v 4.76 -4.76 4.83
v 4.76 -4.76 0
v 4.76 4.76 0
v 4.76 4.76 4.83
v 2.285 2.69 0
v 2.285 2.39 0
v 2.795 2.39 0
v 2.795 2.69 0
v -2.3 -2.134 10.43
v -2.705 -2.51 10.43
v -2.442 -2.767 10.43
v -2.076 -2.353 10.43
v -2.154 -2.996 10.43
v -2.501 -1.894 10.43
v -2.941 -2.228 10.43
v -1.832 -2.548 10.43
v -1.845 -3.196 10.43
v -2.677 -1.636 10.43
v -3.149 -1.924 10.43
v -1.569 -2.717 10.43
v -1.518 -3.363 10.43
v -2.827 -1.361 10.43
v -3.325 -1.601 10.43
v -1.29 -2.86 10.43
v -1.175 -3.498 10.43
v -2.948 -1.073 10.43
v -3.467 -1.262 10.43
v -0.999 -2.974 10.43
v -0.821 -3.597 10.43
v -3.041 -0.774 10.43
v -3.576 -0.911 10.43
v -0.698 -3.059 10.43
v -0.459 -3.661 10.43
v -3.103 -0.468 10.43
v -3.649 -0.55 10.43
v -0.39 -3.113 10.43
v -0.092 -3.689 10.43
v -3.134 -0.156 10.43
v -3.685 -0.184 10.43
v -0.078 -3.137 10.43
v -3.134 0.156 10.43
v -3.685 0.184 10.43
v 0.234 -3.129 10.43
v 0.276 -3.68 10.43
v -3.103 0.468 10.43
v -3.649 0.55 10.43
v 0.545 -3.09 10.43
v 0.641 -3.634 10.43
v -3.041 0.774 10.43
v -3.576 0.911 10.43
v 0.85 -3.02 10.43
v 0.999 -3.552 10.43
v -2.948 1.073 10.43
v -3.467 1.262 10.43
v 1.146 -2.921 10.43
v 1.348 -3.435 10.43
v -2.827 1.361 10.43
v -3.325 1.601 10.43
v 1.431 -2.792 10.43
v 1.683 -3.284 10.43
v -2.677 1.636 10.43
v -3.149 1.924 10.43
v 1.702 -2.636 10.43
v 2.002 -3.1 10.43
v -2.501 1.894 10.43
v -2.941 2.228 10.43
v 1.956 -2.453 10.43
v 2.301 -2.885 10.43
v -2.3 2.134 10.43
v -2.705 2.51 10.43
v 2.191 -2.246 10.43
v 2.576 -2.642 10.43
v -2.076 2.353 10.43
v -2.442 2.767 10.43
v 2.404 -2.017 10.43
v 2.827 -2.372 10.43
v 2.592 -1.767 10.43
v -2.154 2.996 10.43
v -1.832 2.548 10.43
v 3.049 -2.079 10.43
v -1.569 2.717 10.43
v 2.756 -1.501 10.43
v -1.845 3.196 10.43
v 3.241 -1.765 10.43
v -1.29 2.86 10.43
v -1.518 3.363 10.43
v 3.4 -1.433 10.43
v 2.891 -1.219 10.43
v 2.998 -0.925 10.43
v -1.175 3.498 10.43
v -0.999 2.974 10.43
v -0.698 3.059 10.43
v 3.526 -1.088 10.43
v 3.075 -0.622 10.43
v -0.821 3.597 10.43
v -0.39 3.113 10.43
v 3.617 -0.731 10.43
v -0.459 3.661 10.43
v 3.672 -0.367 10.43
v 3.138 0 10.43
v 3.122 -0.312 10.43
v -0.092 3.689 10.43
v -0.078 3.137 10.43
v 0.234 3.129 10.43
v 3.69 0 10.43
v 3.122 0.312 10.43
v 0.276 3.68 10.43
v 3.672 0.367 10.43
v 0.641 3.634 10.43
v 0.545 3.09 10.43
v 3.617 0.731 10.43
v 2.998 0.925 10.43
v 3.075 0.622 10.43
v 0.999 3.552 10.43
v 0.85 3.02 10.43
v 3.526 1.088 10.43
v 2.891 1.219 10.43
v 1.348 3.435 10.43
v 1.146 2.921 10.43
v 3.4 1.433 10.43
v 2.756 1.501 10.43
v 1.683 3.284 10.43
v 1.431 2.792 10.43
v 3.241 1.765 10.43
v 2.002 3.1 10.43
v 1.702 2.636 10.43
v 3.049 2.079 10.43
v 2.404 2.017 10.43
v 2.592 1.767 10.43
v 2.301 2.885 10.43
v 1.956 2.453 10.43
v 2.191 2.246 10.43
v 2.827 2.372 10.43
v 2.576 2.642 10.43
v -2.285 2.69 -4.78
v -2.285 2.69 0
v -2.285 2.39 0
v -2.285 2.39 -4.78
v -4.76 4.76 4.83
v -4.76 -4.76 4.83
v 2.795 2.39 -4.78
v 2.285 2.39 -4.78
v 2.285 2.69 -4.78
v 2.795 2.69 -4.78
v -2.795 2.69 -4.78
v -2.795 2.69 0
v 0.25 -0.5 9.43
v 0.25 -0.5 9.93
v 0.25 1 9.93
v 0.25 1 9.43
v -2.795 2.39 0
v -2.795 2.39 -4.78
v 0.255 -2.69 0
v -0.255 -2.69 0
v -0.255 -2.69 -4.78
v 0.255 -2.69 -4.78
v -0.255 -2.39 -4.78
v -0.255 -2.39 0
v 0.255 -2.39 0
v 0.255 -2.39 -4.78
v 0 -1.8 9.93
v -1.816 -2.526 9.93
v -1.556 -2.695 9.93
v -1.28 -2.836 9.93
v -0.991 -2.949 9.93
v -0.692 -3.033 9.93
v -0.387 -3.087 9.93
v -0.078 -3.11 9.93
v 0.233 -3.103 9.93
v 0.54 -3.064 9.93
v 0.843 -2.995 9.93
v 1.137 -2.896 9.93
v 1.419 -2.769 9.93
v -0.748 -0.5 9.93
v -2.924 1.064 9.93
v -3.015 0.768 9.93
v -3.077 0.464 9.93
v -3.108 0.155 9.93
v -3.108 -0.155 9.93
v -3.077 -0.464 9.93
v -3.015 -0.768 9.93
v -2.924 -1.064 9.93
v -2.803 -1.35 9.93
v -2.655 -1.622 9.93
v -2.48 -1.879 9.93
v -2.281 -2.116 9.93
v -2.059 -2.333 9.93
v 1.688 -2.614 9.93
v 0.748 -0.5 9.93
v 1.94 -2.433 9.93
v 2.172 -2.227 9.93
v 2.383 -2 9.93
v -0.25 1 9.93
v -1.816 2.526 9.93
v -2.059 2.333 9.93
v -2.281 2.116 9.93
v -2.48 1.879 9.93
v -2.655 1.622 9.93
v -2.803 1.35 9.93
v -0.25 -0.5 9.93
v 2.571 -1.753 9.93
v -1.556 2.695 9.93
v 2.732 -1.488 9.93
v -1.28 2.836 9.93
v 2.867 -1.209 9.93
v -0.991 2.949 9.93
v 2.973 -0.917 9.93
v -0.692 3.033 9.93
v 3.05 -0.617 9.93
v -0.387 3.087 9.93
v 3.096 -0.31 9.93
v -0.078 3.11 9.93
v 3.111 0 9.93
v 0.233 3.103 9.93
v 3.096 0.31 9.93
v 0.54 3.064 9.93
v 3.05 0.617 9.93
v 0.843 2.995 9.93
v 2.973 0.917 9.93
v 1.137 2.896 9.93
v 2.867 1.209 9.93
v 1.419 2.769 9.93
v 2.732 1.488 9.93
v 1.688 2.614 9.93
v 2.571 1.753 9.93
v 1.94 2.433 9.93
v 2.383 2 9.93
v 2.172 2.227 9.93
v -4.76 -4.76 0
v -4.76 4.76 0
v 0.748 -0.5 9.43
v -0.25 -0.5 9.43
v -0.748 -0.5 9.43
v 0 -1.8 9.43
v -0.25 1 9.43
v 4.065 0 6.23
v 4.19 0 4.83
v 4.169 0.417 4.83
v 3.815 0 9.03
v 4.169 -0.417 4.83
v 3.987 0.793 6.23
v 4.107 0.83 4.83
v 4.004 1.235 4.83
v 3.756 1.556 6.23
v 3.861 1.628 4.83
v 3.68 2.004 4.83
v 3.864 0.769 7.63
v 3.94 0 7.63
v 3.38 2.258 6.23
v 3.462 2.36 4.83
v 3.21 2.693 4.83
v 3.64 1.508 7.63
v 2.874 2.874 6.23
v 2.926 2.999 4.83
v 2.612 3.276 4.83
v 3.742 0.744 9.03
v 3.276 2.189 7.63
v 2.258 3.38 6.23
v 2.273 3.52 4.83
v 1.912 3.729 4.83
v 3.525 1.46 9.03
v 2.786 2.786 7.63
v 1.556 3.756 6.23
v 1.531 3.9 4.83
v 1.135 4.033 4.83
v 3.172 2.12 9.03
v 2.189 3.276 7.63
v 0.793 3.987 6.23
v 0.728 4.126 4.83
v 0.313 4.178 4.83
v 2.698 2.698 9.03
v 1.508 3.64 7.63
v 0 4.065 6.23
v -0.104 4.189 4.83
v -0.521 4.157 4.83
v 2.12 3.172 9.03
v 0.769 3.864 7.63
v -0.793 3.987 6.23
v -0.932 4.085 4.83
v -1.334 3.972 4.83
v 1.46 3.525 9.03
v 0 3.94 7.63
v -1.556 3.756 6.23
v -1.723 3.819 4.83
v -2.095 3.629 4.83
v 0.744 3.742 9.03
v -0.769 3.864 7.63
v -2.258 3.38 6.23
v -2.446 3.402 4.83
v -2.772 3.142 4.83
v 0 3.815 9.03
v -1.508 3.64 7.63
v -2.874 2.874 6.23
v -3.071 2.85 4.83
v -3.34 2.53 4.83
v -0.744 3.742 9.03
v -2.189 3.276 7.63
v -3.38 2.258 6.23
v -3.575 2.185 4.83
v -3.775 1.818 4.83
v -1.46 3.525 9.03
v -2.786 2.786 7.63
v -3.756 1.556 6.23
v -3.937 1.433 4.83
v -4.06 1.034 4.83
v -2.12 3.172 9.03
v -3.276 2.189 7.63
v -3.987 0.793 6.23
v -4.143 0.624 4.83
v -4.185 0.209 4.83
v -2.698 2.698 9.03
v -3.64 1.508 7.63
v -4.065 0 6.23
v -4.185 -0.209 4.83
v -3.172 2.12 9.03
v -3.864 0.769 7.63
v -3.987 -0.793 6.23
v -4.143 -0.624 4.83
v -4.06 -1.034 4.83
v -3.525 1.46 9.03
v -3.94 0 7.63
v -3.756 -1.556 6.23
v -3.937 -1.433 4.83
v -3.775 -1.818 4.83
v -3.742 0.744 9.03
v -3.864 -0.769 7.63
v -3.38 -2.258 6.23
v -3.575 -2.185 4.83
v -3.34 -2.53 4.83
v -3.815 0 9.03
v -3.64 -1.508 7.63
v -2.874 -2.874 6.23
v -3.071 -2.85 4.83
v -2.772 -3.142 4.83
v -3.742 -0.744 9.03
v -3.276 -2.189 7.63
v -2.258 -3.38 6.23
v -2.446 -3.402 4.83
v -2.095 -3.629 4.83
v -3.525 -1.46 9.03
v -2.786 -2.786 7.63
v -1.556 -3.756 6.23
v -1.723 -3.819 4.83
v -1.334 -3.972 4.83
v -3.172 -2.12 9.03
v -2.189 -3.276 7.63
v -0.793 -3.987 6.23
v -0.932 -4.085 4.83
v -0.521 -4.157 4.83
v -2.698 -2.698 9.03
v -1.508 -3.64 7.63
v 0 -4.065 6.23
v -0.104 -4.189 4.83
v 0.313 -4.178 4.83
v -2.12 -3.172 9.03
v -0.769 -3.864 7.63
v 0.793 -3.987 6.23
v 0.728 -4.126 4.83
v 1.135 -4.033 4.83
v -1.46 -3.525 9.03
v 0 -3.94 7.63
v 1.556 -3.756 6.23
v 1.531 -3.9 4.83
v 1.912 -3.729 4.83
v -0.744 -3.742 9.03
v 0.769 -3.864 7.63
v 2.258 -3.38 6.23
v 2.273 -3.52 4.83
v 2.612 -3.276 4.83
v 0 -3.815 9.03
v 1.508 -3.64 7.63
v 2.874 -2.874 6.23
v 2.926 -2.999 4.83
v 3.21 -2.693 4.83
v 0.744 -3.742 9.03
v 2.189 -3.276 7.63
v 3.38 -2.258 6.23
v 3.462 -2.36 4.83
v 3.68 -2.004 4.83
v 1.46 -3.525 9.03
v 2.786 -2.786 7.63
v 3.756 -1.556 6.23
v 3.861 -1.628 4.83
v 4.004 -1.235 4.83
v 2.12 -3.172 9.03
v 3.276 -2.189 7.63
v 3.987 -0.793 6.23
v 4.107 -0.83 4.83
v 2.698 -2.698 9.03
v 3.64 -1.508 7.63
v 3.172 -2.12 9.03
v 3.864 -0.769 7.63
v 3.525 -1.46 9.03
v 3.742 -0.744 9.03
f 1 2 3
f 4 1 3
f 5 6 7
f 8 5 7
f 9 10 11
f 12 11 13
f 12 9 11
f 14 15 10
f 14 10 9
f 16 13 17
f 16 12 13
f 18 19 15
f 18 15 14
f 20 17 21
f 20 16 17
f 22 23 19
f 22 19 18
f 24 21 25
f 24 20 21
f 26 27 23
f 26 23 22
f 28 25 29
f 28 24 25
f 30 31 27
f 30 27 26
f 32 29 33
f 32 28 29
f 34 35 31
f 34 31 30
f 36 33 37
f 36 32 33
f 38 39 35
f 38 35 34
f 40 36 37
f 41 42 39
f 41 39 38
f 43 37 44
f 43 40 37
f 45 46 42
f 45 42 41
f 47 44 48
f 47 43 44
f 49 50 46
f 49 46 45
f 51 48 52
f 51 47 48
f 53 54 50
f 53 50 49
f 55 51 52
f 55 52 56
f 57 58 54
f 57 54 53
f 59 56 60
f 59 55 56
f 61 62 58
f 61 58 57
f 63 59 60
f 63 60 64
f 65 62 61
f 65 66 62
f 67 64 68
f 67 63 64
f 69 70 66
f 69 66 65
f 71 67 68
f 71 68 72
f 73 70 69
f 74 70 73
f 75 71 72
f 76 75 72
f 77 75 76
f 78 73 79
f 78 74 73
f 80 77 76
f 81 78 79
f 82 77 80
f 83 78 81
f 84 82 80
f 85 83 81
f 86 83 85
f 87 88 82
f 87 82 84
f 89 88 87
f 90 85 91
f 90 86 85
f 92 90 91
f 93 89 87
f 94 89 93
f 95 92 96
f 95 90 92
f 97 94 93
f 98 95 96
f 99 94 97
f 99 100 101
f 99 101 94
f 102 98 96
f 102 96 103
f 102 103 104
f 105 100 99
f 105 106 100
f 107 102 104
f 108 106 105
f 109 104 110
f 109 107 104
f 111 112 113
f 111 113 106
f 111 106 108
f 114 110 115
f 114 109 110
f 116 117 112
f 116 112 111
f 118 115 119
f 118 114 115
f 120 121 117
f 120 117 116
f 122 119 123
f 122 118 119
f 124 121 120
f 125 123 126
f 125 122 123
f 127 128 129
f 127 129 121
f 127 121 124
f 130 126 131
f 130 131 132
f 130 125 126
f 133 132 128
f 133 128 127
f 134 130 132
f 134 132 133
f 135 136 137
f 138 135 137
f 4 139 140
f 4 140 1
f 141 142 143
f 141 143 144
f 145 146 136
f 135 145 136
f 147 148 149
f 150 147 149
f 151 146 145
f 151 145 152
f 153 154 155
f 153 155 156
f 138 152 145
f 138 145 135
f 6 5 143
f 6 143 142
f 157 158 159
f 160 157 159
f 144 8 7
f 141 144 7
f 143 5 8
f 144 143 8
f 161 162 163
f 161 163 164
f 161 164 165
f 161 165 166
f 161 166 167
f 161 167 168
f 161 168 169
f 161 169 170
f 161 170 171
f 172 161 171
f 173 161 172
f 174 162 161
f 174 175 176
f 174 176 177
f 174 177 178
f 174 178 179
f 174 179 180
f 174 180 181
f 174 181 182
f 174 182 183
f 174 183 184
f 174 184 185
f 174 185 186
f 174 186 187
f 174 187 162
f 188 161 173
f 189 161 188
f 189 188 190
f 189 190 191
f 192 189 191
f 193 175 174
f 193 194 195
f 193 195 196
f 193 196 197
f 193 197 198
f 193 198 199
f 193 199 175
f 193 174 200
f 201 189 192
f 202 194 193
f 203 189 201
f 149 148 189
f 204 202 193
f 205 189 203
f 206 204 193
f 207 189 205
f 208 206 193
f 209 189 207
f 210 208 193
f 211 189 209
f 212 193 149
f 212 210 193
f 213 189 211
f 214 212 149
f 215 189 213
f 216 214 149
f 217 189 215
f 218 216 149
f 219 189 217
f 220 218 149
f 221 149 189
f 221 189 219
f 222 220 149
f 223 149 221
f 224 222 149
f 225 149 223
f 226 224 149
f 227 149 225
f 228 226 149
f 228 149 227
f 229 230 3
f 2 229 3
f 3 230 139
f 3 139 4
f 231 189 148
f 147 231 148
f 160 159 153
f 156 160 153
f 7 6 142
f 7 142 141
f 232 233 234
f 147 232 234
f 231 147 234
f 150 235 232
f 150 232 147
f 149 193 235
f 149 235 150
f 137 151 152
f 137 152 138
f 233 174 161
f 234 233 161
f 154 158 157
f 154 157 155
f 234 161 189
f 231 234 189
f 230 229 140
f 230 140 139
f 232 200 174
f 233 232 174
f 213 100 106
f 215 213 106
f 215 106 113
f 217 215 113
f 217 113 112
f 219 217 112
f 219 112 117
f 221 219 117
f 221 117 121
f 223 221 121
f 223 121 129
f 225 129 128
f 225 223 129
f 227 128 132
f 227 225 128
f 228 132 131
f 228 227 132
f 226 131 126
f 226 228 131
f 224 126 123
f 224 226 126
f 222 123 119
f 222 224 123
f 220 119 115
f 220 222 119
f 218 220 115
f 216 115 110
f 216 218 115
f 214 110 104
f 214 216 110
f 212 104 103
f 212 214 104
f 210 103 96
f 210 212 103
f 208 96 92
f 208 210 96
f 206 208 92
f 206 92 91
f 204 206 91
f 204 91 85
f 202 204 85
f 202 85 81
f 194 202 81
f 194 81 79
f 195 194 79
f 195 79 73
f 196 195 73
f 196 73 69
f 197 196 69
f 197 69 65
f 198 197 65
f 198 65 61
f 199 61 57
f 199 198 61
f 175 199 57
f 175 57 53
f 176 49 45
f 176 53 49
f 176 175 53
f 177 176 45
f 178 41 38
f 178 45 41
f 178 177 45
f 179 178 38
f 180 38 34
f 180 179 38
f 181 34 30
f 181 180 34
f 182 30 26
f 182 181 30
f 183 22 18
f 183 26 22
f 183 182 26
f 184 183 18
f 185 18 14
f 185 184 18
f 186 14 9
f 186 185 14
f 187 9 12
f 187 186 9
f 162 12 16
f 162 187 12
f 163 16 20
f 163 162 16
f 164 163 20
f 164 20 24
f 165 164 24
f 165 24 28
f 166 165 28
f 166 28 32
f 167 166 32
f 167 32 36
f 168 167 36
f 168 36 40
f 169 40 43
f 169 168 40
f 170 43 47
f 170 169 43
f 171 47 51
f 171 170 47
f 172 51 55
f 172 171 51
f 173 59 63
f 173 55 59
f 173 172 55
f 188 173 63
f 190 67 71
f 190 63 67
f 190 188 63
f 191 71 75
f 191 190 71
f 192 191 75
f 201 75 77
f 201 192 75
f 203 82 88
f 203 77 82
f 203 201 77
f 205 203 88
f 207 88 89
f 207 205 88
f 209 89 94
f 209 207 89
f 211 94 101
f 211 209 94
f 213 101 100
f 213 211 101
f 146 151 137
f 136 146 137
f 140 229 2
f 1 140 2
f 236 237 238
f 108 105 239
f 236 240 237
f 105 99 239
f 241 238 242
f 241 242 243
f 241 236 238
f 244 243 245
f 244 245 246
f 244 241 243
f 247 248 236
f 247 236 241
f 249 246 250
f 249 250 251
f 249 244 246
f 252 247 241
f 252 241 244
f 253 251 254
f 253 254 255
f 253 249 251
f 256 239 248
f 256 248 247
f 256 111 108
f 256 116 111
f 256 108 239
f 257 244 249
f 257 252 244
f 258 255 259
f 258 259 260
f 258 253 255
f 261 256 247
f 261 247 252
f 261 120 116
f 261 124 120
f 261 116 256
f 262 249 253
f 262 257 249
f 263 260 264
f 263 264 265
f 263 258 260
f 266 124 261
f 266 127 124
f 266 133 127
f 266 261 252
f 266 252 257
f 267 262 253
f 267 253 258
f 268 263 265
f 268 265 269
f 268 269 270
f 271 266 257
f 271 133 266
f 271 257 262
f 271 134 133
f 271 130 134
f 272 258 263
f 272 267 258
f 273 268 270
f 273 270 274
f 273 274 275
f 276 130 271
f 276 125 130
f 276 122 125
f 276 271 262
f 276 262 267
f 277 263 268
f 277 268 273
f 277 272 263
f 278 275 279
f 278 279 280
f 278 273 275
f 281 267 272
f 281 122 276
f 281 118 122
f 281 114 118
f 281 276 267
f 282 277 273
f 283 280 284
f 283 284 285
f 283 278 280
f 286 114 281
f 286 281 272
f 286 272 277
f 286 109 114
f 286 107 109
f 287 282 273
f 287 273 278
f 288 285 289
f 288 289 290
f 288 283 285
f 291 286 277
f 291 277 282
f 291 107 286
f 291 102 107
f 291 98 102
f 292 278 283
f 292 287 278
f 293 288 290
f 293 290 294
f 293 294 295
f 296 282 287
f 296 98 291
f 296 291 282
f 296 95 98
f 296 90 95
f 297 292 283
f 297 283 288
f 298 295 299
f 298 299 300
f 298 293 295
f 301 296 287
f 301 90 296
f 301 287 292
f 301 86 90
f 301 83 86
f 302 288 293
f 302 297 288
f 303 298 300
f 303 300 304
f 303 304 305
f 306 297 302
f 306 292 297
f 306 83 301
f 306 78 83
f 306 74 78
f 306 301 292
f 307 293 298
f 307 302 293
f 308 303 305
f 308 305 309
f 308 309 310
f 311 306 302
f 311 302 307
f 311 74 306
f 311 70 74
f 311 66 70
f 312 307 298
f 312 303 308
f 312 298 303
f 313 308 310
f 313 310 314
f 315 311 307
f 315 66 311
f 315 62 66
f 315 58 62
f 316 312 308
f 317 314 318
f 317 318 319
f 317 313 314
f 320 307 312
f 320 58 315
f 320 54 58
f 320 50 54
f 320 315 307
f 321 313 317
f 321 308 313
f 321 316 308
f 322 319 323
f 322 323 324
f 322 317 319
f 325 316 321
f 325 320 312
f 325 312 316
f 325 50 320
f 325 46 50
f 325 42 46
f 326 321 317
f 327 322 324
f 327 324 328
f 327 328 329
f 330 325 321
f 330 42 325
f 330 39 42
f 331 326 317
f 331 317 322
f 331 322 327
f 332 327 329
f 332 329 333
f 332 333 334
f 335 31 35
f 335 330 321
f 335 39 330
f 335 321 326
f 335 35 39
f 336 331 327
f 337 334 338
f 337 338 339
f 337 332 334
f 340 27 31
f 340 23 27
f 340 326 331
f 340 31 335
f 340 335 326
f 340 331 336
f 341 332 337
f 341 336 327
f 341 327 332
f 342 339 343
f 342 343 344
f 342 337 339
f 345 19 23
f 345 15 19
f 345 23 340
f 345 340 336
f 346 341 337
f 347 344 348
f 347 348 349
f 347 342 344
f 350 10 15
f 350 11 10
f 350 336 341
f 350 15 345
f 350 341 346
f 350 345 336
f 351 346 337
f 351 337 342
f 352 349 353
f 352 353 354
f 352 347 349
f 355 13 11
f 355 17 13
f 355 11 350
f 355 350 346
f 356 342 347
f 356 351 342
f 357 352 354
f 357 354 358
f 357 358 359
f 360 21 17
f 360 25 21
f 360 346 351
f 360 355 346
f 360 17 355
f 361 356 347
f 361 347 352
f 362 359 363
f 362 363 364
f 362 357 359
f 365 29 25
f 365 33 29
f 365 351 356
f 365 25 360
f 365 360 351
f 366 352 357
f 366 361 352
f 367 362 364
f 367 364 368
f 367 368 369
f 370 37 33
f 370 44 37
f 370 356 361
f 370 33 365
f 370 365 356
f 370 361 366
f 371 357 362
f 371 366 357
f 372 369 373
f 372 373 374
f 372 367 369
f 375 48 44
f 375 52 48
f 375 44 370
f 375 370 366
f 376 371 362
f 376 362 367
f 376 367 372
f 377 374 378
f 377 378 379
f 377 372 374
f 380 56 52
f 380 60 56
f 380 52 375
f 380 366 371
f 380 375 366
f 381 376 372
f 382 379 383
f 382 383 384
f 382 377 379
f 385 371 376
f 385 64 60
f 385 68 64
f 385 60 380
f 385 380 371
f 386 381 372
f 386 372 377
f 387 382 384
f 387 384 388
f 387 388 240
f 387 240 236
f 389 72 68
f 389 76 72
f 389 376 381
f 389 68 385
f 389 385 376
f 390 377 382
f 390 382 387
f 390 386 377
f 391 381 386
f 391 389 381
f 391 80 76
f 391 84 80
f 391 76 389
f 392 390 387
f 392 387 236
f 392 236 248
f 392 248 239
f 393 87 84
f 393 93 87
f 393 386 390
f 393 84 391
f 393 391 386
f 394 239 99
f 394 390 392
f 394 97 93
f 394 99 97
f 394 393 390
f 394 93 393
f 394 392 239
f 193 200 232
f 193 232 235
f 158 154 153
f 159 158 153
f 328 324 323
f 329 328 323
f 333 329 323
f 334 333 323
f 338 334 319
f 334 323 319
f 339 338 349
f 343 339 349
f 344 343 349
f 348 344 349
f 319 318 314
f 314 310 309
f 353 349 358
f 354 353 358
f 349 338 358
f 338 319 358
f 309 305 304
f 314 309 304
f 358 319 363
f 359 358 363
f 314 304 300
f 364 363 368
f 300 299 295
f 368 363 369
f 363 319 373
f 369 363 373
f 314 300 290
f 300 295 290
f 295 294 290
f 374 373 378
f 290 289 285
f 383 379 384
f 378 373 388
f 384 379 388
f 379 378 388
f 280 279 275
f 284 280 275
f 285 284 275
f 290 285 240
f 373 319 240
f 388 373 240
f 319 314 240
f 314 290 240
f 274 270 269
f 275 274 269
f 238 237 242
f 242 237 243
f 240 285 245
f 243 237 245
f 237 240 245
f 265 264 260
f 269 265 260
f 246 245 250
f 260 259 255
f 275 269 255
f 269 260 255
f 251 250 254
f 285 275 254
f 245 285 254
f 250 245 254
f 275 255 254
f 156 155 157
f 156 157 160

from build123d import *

# Parameters (mm, degrees)
F0_W      = 9.52
F0_H      = 9.52
F1_DEPTH  = 4.83
F4_R      = 4.19
F11_R     = 3.69
F12_R     = 3.19
F12_W     = 0.5
F12_H     = 1.5
F12_H_2   = 0.5
F8_DEPTH  = 1.5
F8_TAPER  = 3
F13_DEPTH = 2
F9_W      = 0.51
F9_H      = 0.3
F10_DEPTH = 4.78


with BuildPart() as f1:
    # F0 (on Top) → F1 (new body)
    with BuildSketch(Plane.XY):
        Rectangle(F0_W, F0_H)
    extrude(amount=F1_DEPTH)


with BuildPart() as f6:
    # F4 (on offset) → F6 section 0
    with BuildSketch(Plane.XY.offset(4.83)):
        Circle(F4_R)
    # F11 (on offset) → F6 section 1
    with BuildSketch(Plane.XY.offset(10.43)):
        Circle(F11_R)
    loft()

    # F12 (on offset) → F8 (cut)
    with BuildSketch(Plane.XY.offset(11.43)):
        Circle(F12_R)
        Polygon((0.25, 1), (0.25, -0.5), (0.7483314774, -0.5), (0, -1.8), (-0.7483314774, -0.5), (-0.25, -0.5), (-0.25, 1), align=None, mode=Mode.SUBTRACT)
        with Locations((0, 0.25)):
            Rectangle(F12_W, F12_H)
        Polygon((0.25, -0.5), (0.25, -1), (-0.25, -1), (-0.25, -0.5), (-0.7483314774, -0.5), (0, -1.8), (0.7483314774, -0.5), align=None)
        with Locations((0, -0.75)):
            Rectangle(F12_W, F12_H_2)
    extrude(amount=-F8_DEPTH, taper=F8_TAPER, mode=Mode.SUBTRACT)

    # F12 (on offset) → F13 (cut)
    with BuildSketch(Plane.XY.offset(11.43)):
        Polygon((0.25, -0.5), (0.25, -1), (-0.25, -1), (-0.25, -0.5), (-0.7483314774, -0.5), (0, -1.8), (0.7483314774, -0.5), align=None)
        with Locations((0, 0.25)):
            Rectangle(F12_W, F12_H)
        with Locations((0, -0.75)):
            Rectangle(F12_W, F12_H_2)
    extrude(amount=-F13_DEPTH, mode=Mode.SUBTRACT)


with BuildPart() as f10:
    # F9 (on face) → F10 (new body)
    with BuildSketch(Plane(origin=(0, 0, 0), x_dir=(1, 0, 0), z_dir=(0, 0, -1))):
        with Locations((-2.54, -2.54)):
            Rectangle(F9_W, F9_H)
    extrude(amount=F10_DEPTH)


with BuildPart() as f10b:
    # F9 (on face) → F10, piece 2 (new body)
    with BuildSketch(Plane(origin=(0, 0, 0), x_dir=(1, 0, 0), z_dir=(0, 0, -1))):
        with Locations((2.54, -2.54)):
            Rectangle(F9_W, F9_H)
    extrude(amount=F10_DEPTH)


with BuildPart() as f10c:
    # F9 (on face) → F10, piece 3 (new body)
    with BuildSketch(Plane(origin=(0, 0, 0), x_dir=(1, 0, 0), z_dir=(0, 0, -1))):
        with Locations((0, 2.54)):
            Rectangle(F9_W, F9_H)
    extrude(amount=F10_DEPTH)


solid = Compound([f1.part, f6.part, f10.part, f10b.part, f10c.part])
